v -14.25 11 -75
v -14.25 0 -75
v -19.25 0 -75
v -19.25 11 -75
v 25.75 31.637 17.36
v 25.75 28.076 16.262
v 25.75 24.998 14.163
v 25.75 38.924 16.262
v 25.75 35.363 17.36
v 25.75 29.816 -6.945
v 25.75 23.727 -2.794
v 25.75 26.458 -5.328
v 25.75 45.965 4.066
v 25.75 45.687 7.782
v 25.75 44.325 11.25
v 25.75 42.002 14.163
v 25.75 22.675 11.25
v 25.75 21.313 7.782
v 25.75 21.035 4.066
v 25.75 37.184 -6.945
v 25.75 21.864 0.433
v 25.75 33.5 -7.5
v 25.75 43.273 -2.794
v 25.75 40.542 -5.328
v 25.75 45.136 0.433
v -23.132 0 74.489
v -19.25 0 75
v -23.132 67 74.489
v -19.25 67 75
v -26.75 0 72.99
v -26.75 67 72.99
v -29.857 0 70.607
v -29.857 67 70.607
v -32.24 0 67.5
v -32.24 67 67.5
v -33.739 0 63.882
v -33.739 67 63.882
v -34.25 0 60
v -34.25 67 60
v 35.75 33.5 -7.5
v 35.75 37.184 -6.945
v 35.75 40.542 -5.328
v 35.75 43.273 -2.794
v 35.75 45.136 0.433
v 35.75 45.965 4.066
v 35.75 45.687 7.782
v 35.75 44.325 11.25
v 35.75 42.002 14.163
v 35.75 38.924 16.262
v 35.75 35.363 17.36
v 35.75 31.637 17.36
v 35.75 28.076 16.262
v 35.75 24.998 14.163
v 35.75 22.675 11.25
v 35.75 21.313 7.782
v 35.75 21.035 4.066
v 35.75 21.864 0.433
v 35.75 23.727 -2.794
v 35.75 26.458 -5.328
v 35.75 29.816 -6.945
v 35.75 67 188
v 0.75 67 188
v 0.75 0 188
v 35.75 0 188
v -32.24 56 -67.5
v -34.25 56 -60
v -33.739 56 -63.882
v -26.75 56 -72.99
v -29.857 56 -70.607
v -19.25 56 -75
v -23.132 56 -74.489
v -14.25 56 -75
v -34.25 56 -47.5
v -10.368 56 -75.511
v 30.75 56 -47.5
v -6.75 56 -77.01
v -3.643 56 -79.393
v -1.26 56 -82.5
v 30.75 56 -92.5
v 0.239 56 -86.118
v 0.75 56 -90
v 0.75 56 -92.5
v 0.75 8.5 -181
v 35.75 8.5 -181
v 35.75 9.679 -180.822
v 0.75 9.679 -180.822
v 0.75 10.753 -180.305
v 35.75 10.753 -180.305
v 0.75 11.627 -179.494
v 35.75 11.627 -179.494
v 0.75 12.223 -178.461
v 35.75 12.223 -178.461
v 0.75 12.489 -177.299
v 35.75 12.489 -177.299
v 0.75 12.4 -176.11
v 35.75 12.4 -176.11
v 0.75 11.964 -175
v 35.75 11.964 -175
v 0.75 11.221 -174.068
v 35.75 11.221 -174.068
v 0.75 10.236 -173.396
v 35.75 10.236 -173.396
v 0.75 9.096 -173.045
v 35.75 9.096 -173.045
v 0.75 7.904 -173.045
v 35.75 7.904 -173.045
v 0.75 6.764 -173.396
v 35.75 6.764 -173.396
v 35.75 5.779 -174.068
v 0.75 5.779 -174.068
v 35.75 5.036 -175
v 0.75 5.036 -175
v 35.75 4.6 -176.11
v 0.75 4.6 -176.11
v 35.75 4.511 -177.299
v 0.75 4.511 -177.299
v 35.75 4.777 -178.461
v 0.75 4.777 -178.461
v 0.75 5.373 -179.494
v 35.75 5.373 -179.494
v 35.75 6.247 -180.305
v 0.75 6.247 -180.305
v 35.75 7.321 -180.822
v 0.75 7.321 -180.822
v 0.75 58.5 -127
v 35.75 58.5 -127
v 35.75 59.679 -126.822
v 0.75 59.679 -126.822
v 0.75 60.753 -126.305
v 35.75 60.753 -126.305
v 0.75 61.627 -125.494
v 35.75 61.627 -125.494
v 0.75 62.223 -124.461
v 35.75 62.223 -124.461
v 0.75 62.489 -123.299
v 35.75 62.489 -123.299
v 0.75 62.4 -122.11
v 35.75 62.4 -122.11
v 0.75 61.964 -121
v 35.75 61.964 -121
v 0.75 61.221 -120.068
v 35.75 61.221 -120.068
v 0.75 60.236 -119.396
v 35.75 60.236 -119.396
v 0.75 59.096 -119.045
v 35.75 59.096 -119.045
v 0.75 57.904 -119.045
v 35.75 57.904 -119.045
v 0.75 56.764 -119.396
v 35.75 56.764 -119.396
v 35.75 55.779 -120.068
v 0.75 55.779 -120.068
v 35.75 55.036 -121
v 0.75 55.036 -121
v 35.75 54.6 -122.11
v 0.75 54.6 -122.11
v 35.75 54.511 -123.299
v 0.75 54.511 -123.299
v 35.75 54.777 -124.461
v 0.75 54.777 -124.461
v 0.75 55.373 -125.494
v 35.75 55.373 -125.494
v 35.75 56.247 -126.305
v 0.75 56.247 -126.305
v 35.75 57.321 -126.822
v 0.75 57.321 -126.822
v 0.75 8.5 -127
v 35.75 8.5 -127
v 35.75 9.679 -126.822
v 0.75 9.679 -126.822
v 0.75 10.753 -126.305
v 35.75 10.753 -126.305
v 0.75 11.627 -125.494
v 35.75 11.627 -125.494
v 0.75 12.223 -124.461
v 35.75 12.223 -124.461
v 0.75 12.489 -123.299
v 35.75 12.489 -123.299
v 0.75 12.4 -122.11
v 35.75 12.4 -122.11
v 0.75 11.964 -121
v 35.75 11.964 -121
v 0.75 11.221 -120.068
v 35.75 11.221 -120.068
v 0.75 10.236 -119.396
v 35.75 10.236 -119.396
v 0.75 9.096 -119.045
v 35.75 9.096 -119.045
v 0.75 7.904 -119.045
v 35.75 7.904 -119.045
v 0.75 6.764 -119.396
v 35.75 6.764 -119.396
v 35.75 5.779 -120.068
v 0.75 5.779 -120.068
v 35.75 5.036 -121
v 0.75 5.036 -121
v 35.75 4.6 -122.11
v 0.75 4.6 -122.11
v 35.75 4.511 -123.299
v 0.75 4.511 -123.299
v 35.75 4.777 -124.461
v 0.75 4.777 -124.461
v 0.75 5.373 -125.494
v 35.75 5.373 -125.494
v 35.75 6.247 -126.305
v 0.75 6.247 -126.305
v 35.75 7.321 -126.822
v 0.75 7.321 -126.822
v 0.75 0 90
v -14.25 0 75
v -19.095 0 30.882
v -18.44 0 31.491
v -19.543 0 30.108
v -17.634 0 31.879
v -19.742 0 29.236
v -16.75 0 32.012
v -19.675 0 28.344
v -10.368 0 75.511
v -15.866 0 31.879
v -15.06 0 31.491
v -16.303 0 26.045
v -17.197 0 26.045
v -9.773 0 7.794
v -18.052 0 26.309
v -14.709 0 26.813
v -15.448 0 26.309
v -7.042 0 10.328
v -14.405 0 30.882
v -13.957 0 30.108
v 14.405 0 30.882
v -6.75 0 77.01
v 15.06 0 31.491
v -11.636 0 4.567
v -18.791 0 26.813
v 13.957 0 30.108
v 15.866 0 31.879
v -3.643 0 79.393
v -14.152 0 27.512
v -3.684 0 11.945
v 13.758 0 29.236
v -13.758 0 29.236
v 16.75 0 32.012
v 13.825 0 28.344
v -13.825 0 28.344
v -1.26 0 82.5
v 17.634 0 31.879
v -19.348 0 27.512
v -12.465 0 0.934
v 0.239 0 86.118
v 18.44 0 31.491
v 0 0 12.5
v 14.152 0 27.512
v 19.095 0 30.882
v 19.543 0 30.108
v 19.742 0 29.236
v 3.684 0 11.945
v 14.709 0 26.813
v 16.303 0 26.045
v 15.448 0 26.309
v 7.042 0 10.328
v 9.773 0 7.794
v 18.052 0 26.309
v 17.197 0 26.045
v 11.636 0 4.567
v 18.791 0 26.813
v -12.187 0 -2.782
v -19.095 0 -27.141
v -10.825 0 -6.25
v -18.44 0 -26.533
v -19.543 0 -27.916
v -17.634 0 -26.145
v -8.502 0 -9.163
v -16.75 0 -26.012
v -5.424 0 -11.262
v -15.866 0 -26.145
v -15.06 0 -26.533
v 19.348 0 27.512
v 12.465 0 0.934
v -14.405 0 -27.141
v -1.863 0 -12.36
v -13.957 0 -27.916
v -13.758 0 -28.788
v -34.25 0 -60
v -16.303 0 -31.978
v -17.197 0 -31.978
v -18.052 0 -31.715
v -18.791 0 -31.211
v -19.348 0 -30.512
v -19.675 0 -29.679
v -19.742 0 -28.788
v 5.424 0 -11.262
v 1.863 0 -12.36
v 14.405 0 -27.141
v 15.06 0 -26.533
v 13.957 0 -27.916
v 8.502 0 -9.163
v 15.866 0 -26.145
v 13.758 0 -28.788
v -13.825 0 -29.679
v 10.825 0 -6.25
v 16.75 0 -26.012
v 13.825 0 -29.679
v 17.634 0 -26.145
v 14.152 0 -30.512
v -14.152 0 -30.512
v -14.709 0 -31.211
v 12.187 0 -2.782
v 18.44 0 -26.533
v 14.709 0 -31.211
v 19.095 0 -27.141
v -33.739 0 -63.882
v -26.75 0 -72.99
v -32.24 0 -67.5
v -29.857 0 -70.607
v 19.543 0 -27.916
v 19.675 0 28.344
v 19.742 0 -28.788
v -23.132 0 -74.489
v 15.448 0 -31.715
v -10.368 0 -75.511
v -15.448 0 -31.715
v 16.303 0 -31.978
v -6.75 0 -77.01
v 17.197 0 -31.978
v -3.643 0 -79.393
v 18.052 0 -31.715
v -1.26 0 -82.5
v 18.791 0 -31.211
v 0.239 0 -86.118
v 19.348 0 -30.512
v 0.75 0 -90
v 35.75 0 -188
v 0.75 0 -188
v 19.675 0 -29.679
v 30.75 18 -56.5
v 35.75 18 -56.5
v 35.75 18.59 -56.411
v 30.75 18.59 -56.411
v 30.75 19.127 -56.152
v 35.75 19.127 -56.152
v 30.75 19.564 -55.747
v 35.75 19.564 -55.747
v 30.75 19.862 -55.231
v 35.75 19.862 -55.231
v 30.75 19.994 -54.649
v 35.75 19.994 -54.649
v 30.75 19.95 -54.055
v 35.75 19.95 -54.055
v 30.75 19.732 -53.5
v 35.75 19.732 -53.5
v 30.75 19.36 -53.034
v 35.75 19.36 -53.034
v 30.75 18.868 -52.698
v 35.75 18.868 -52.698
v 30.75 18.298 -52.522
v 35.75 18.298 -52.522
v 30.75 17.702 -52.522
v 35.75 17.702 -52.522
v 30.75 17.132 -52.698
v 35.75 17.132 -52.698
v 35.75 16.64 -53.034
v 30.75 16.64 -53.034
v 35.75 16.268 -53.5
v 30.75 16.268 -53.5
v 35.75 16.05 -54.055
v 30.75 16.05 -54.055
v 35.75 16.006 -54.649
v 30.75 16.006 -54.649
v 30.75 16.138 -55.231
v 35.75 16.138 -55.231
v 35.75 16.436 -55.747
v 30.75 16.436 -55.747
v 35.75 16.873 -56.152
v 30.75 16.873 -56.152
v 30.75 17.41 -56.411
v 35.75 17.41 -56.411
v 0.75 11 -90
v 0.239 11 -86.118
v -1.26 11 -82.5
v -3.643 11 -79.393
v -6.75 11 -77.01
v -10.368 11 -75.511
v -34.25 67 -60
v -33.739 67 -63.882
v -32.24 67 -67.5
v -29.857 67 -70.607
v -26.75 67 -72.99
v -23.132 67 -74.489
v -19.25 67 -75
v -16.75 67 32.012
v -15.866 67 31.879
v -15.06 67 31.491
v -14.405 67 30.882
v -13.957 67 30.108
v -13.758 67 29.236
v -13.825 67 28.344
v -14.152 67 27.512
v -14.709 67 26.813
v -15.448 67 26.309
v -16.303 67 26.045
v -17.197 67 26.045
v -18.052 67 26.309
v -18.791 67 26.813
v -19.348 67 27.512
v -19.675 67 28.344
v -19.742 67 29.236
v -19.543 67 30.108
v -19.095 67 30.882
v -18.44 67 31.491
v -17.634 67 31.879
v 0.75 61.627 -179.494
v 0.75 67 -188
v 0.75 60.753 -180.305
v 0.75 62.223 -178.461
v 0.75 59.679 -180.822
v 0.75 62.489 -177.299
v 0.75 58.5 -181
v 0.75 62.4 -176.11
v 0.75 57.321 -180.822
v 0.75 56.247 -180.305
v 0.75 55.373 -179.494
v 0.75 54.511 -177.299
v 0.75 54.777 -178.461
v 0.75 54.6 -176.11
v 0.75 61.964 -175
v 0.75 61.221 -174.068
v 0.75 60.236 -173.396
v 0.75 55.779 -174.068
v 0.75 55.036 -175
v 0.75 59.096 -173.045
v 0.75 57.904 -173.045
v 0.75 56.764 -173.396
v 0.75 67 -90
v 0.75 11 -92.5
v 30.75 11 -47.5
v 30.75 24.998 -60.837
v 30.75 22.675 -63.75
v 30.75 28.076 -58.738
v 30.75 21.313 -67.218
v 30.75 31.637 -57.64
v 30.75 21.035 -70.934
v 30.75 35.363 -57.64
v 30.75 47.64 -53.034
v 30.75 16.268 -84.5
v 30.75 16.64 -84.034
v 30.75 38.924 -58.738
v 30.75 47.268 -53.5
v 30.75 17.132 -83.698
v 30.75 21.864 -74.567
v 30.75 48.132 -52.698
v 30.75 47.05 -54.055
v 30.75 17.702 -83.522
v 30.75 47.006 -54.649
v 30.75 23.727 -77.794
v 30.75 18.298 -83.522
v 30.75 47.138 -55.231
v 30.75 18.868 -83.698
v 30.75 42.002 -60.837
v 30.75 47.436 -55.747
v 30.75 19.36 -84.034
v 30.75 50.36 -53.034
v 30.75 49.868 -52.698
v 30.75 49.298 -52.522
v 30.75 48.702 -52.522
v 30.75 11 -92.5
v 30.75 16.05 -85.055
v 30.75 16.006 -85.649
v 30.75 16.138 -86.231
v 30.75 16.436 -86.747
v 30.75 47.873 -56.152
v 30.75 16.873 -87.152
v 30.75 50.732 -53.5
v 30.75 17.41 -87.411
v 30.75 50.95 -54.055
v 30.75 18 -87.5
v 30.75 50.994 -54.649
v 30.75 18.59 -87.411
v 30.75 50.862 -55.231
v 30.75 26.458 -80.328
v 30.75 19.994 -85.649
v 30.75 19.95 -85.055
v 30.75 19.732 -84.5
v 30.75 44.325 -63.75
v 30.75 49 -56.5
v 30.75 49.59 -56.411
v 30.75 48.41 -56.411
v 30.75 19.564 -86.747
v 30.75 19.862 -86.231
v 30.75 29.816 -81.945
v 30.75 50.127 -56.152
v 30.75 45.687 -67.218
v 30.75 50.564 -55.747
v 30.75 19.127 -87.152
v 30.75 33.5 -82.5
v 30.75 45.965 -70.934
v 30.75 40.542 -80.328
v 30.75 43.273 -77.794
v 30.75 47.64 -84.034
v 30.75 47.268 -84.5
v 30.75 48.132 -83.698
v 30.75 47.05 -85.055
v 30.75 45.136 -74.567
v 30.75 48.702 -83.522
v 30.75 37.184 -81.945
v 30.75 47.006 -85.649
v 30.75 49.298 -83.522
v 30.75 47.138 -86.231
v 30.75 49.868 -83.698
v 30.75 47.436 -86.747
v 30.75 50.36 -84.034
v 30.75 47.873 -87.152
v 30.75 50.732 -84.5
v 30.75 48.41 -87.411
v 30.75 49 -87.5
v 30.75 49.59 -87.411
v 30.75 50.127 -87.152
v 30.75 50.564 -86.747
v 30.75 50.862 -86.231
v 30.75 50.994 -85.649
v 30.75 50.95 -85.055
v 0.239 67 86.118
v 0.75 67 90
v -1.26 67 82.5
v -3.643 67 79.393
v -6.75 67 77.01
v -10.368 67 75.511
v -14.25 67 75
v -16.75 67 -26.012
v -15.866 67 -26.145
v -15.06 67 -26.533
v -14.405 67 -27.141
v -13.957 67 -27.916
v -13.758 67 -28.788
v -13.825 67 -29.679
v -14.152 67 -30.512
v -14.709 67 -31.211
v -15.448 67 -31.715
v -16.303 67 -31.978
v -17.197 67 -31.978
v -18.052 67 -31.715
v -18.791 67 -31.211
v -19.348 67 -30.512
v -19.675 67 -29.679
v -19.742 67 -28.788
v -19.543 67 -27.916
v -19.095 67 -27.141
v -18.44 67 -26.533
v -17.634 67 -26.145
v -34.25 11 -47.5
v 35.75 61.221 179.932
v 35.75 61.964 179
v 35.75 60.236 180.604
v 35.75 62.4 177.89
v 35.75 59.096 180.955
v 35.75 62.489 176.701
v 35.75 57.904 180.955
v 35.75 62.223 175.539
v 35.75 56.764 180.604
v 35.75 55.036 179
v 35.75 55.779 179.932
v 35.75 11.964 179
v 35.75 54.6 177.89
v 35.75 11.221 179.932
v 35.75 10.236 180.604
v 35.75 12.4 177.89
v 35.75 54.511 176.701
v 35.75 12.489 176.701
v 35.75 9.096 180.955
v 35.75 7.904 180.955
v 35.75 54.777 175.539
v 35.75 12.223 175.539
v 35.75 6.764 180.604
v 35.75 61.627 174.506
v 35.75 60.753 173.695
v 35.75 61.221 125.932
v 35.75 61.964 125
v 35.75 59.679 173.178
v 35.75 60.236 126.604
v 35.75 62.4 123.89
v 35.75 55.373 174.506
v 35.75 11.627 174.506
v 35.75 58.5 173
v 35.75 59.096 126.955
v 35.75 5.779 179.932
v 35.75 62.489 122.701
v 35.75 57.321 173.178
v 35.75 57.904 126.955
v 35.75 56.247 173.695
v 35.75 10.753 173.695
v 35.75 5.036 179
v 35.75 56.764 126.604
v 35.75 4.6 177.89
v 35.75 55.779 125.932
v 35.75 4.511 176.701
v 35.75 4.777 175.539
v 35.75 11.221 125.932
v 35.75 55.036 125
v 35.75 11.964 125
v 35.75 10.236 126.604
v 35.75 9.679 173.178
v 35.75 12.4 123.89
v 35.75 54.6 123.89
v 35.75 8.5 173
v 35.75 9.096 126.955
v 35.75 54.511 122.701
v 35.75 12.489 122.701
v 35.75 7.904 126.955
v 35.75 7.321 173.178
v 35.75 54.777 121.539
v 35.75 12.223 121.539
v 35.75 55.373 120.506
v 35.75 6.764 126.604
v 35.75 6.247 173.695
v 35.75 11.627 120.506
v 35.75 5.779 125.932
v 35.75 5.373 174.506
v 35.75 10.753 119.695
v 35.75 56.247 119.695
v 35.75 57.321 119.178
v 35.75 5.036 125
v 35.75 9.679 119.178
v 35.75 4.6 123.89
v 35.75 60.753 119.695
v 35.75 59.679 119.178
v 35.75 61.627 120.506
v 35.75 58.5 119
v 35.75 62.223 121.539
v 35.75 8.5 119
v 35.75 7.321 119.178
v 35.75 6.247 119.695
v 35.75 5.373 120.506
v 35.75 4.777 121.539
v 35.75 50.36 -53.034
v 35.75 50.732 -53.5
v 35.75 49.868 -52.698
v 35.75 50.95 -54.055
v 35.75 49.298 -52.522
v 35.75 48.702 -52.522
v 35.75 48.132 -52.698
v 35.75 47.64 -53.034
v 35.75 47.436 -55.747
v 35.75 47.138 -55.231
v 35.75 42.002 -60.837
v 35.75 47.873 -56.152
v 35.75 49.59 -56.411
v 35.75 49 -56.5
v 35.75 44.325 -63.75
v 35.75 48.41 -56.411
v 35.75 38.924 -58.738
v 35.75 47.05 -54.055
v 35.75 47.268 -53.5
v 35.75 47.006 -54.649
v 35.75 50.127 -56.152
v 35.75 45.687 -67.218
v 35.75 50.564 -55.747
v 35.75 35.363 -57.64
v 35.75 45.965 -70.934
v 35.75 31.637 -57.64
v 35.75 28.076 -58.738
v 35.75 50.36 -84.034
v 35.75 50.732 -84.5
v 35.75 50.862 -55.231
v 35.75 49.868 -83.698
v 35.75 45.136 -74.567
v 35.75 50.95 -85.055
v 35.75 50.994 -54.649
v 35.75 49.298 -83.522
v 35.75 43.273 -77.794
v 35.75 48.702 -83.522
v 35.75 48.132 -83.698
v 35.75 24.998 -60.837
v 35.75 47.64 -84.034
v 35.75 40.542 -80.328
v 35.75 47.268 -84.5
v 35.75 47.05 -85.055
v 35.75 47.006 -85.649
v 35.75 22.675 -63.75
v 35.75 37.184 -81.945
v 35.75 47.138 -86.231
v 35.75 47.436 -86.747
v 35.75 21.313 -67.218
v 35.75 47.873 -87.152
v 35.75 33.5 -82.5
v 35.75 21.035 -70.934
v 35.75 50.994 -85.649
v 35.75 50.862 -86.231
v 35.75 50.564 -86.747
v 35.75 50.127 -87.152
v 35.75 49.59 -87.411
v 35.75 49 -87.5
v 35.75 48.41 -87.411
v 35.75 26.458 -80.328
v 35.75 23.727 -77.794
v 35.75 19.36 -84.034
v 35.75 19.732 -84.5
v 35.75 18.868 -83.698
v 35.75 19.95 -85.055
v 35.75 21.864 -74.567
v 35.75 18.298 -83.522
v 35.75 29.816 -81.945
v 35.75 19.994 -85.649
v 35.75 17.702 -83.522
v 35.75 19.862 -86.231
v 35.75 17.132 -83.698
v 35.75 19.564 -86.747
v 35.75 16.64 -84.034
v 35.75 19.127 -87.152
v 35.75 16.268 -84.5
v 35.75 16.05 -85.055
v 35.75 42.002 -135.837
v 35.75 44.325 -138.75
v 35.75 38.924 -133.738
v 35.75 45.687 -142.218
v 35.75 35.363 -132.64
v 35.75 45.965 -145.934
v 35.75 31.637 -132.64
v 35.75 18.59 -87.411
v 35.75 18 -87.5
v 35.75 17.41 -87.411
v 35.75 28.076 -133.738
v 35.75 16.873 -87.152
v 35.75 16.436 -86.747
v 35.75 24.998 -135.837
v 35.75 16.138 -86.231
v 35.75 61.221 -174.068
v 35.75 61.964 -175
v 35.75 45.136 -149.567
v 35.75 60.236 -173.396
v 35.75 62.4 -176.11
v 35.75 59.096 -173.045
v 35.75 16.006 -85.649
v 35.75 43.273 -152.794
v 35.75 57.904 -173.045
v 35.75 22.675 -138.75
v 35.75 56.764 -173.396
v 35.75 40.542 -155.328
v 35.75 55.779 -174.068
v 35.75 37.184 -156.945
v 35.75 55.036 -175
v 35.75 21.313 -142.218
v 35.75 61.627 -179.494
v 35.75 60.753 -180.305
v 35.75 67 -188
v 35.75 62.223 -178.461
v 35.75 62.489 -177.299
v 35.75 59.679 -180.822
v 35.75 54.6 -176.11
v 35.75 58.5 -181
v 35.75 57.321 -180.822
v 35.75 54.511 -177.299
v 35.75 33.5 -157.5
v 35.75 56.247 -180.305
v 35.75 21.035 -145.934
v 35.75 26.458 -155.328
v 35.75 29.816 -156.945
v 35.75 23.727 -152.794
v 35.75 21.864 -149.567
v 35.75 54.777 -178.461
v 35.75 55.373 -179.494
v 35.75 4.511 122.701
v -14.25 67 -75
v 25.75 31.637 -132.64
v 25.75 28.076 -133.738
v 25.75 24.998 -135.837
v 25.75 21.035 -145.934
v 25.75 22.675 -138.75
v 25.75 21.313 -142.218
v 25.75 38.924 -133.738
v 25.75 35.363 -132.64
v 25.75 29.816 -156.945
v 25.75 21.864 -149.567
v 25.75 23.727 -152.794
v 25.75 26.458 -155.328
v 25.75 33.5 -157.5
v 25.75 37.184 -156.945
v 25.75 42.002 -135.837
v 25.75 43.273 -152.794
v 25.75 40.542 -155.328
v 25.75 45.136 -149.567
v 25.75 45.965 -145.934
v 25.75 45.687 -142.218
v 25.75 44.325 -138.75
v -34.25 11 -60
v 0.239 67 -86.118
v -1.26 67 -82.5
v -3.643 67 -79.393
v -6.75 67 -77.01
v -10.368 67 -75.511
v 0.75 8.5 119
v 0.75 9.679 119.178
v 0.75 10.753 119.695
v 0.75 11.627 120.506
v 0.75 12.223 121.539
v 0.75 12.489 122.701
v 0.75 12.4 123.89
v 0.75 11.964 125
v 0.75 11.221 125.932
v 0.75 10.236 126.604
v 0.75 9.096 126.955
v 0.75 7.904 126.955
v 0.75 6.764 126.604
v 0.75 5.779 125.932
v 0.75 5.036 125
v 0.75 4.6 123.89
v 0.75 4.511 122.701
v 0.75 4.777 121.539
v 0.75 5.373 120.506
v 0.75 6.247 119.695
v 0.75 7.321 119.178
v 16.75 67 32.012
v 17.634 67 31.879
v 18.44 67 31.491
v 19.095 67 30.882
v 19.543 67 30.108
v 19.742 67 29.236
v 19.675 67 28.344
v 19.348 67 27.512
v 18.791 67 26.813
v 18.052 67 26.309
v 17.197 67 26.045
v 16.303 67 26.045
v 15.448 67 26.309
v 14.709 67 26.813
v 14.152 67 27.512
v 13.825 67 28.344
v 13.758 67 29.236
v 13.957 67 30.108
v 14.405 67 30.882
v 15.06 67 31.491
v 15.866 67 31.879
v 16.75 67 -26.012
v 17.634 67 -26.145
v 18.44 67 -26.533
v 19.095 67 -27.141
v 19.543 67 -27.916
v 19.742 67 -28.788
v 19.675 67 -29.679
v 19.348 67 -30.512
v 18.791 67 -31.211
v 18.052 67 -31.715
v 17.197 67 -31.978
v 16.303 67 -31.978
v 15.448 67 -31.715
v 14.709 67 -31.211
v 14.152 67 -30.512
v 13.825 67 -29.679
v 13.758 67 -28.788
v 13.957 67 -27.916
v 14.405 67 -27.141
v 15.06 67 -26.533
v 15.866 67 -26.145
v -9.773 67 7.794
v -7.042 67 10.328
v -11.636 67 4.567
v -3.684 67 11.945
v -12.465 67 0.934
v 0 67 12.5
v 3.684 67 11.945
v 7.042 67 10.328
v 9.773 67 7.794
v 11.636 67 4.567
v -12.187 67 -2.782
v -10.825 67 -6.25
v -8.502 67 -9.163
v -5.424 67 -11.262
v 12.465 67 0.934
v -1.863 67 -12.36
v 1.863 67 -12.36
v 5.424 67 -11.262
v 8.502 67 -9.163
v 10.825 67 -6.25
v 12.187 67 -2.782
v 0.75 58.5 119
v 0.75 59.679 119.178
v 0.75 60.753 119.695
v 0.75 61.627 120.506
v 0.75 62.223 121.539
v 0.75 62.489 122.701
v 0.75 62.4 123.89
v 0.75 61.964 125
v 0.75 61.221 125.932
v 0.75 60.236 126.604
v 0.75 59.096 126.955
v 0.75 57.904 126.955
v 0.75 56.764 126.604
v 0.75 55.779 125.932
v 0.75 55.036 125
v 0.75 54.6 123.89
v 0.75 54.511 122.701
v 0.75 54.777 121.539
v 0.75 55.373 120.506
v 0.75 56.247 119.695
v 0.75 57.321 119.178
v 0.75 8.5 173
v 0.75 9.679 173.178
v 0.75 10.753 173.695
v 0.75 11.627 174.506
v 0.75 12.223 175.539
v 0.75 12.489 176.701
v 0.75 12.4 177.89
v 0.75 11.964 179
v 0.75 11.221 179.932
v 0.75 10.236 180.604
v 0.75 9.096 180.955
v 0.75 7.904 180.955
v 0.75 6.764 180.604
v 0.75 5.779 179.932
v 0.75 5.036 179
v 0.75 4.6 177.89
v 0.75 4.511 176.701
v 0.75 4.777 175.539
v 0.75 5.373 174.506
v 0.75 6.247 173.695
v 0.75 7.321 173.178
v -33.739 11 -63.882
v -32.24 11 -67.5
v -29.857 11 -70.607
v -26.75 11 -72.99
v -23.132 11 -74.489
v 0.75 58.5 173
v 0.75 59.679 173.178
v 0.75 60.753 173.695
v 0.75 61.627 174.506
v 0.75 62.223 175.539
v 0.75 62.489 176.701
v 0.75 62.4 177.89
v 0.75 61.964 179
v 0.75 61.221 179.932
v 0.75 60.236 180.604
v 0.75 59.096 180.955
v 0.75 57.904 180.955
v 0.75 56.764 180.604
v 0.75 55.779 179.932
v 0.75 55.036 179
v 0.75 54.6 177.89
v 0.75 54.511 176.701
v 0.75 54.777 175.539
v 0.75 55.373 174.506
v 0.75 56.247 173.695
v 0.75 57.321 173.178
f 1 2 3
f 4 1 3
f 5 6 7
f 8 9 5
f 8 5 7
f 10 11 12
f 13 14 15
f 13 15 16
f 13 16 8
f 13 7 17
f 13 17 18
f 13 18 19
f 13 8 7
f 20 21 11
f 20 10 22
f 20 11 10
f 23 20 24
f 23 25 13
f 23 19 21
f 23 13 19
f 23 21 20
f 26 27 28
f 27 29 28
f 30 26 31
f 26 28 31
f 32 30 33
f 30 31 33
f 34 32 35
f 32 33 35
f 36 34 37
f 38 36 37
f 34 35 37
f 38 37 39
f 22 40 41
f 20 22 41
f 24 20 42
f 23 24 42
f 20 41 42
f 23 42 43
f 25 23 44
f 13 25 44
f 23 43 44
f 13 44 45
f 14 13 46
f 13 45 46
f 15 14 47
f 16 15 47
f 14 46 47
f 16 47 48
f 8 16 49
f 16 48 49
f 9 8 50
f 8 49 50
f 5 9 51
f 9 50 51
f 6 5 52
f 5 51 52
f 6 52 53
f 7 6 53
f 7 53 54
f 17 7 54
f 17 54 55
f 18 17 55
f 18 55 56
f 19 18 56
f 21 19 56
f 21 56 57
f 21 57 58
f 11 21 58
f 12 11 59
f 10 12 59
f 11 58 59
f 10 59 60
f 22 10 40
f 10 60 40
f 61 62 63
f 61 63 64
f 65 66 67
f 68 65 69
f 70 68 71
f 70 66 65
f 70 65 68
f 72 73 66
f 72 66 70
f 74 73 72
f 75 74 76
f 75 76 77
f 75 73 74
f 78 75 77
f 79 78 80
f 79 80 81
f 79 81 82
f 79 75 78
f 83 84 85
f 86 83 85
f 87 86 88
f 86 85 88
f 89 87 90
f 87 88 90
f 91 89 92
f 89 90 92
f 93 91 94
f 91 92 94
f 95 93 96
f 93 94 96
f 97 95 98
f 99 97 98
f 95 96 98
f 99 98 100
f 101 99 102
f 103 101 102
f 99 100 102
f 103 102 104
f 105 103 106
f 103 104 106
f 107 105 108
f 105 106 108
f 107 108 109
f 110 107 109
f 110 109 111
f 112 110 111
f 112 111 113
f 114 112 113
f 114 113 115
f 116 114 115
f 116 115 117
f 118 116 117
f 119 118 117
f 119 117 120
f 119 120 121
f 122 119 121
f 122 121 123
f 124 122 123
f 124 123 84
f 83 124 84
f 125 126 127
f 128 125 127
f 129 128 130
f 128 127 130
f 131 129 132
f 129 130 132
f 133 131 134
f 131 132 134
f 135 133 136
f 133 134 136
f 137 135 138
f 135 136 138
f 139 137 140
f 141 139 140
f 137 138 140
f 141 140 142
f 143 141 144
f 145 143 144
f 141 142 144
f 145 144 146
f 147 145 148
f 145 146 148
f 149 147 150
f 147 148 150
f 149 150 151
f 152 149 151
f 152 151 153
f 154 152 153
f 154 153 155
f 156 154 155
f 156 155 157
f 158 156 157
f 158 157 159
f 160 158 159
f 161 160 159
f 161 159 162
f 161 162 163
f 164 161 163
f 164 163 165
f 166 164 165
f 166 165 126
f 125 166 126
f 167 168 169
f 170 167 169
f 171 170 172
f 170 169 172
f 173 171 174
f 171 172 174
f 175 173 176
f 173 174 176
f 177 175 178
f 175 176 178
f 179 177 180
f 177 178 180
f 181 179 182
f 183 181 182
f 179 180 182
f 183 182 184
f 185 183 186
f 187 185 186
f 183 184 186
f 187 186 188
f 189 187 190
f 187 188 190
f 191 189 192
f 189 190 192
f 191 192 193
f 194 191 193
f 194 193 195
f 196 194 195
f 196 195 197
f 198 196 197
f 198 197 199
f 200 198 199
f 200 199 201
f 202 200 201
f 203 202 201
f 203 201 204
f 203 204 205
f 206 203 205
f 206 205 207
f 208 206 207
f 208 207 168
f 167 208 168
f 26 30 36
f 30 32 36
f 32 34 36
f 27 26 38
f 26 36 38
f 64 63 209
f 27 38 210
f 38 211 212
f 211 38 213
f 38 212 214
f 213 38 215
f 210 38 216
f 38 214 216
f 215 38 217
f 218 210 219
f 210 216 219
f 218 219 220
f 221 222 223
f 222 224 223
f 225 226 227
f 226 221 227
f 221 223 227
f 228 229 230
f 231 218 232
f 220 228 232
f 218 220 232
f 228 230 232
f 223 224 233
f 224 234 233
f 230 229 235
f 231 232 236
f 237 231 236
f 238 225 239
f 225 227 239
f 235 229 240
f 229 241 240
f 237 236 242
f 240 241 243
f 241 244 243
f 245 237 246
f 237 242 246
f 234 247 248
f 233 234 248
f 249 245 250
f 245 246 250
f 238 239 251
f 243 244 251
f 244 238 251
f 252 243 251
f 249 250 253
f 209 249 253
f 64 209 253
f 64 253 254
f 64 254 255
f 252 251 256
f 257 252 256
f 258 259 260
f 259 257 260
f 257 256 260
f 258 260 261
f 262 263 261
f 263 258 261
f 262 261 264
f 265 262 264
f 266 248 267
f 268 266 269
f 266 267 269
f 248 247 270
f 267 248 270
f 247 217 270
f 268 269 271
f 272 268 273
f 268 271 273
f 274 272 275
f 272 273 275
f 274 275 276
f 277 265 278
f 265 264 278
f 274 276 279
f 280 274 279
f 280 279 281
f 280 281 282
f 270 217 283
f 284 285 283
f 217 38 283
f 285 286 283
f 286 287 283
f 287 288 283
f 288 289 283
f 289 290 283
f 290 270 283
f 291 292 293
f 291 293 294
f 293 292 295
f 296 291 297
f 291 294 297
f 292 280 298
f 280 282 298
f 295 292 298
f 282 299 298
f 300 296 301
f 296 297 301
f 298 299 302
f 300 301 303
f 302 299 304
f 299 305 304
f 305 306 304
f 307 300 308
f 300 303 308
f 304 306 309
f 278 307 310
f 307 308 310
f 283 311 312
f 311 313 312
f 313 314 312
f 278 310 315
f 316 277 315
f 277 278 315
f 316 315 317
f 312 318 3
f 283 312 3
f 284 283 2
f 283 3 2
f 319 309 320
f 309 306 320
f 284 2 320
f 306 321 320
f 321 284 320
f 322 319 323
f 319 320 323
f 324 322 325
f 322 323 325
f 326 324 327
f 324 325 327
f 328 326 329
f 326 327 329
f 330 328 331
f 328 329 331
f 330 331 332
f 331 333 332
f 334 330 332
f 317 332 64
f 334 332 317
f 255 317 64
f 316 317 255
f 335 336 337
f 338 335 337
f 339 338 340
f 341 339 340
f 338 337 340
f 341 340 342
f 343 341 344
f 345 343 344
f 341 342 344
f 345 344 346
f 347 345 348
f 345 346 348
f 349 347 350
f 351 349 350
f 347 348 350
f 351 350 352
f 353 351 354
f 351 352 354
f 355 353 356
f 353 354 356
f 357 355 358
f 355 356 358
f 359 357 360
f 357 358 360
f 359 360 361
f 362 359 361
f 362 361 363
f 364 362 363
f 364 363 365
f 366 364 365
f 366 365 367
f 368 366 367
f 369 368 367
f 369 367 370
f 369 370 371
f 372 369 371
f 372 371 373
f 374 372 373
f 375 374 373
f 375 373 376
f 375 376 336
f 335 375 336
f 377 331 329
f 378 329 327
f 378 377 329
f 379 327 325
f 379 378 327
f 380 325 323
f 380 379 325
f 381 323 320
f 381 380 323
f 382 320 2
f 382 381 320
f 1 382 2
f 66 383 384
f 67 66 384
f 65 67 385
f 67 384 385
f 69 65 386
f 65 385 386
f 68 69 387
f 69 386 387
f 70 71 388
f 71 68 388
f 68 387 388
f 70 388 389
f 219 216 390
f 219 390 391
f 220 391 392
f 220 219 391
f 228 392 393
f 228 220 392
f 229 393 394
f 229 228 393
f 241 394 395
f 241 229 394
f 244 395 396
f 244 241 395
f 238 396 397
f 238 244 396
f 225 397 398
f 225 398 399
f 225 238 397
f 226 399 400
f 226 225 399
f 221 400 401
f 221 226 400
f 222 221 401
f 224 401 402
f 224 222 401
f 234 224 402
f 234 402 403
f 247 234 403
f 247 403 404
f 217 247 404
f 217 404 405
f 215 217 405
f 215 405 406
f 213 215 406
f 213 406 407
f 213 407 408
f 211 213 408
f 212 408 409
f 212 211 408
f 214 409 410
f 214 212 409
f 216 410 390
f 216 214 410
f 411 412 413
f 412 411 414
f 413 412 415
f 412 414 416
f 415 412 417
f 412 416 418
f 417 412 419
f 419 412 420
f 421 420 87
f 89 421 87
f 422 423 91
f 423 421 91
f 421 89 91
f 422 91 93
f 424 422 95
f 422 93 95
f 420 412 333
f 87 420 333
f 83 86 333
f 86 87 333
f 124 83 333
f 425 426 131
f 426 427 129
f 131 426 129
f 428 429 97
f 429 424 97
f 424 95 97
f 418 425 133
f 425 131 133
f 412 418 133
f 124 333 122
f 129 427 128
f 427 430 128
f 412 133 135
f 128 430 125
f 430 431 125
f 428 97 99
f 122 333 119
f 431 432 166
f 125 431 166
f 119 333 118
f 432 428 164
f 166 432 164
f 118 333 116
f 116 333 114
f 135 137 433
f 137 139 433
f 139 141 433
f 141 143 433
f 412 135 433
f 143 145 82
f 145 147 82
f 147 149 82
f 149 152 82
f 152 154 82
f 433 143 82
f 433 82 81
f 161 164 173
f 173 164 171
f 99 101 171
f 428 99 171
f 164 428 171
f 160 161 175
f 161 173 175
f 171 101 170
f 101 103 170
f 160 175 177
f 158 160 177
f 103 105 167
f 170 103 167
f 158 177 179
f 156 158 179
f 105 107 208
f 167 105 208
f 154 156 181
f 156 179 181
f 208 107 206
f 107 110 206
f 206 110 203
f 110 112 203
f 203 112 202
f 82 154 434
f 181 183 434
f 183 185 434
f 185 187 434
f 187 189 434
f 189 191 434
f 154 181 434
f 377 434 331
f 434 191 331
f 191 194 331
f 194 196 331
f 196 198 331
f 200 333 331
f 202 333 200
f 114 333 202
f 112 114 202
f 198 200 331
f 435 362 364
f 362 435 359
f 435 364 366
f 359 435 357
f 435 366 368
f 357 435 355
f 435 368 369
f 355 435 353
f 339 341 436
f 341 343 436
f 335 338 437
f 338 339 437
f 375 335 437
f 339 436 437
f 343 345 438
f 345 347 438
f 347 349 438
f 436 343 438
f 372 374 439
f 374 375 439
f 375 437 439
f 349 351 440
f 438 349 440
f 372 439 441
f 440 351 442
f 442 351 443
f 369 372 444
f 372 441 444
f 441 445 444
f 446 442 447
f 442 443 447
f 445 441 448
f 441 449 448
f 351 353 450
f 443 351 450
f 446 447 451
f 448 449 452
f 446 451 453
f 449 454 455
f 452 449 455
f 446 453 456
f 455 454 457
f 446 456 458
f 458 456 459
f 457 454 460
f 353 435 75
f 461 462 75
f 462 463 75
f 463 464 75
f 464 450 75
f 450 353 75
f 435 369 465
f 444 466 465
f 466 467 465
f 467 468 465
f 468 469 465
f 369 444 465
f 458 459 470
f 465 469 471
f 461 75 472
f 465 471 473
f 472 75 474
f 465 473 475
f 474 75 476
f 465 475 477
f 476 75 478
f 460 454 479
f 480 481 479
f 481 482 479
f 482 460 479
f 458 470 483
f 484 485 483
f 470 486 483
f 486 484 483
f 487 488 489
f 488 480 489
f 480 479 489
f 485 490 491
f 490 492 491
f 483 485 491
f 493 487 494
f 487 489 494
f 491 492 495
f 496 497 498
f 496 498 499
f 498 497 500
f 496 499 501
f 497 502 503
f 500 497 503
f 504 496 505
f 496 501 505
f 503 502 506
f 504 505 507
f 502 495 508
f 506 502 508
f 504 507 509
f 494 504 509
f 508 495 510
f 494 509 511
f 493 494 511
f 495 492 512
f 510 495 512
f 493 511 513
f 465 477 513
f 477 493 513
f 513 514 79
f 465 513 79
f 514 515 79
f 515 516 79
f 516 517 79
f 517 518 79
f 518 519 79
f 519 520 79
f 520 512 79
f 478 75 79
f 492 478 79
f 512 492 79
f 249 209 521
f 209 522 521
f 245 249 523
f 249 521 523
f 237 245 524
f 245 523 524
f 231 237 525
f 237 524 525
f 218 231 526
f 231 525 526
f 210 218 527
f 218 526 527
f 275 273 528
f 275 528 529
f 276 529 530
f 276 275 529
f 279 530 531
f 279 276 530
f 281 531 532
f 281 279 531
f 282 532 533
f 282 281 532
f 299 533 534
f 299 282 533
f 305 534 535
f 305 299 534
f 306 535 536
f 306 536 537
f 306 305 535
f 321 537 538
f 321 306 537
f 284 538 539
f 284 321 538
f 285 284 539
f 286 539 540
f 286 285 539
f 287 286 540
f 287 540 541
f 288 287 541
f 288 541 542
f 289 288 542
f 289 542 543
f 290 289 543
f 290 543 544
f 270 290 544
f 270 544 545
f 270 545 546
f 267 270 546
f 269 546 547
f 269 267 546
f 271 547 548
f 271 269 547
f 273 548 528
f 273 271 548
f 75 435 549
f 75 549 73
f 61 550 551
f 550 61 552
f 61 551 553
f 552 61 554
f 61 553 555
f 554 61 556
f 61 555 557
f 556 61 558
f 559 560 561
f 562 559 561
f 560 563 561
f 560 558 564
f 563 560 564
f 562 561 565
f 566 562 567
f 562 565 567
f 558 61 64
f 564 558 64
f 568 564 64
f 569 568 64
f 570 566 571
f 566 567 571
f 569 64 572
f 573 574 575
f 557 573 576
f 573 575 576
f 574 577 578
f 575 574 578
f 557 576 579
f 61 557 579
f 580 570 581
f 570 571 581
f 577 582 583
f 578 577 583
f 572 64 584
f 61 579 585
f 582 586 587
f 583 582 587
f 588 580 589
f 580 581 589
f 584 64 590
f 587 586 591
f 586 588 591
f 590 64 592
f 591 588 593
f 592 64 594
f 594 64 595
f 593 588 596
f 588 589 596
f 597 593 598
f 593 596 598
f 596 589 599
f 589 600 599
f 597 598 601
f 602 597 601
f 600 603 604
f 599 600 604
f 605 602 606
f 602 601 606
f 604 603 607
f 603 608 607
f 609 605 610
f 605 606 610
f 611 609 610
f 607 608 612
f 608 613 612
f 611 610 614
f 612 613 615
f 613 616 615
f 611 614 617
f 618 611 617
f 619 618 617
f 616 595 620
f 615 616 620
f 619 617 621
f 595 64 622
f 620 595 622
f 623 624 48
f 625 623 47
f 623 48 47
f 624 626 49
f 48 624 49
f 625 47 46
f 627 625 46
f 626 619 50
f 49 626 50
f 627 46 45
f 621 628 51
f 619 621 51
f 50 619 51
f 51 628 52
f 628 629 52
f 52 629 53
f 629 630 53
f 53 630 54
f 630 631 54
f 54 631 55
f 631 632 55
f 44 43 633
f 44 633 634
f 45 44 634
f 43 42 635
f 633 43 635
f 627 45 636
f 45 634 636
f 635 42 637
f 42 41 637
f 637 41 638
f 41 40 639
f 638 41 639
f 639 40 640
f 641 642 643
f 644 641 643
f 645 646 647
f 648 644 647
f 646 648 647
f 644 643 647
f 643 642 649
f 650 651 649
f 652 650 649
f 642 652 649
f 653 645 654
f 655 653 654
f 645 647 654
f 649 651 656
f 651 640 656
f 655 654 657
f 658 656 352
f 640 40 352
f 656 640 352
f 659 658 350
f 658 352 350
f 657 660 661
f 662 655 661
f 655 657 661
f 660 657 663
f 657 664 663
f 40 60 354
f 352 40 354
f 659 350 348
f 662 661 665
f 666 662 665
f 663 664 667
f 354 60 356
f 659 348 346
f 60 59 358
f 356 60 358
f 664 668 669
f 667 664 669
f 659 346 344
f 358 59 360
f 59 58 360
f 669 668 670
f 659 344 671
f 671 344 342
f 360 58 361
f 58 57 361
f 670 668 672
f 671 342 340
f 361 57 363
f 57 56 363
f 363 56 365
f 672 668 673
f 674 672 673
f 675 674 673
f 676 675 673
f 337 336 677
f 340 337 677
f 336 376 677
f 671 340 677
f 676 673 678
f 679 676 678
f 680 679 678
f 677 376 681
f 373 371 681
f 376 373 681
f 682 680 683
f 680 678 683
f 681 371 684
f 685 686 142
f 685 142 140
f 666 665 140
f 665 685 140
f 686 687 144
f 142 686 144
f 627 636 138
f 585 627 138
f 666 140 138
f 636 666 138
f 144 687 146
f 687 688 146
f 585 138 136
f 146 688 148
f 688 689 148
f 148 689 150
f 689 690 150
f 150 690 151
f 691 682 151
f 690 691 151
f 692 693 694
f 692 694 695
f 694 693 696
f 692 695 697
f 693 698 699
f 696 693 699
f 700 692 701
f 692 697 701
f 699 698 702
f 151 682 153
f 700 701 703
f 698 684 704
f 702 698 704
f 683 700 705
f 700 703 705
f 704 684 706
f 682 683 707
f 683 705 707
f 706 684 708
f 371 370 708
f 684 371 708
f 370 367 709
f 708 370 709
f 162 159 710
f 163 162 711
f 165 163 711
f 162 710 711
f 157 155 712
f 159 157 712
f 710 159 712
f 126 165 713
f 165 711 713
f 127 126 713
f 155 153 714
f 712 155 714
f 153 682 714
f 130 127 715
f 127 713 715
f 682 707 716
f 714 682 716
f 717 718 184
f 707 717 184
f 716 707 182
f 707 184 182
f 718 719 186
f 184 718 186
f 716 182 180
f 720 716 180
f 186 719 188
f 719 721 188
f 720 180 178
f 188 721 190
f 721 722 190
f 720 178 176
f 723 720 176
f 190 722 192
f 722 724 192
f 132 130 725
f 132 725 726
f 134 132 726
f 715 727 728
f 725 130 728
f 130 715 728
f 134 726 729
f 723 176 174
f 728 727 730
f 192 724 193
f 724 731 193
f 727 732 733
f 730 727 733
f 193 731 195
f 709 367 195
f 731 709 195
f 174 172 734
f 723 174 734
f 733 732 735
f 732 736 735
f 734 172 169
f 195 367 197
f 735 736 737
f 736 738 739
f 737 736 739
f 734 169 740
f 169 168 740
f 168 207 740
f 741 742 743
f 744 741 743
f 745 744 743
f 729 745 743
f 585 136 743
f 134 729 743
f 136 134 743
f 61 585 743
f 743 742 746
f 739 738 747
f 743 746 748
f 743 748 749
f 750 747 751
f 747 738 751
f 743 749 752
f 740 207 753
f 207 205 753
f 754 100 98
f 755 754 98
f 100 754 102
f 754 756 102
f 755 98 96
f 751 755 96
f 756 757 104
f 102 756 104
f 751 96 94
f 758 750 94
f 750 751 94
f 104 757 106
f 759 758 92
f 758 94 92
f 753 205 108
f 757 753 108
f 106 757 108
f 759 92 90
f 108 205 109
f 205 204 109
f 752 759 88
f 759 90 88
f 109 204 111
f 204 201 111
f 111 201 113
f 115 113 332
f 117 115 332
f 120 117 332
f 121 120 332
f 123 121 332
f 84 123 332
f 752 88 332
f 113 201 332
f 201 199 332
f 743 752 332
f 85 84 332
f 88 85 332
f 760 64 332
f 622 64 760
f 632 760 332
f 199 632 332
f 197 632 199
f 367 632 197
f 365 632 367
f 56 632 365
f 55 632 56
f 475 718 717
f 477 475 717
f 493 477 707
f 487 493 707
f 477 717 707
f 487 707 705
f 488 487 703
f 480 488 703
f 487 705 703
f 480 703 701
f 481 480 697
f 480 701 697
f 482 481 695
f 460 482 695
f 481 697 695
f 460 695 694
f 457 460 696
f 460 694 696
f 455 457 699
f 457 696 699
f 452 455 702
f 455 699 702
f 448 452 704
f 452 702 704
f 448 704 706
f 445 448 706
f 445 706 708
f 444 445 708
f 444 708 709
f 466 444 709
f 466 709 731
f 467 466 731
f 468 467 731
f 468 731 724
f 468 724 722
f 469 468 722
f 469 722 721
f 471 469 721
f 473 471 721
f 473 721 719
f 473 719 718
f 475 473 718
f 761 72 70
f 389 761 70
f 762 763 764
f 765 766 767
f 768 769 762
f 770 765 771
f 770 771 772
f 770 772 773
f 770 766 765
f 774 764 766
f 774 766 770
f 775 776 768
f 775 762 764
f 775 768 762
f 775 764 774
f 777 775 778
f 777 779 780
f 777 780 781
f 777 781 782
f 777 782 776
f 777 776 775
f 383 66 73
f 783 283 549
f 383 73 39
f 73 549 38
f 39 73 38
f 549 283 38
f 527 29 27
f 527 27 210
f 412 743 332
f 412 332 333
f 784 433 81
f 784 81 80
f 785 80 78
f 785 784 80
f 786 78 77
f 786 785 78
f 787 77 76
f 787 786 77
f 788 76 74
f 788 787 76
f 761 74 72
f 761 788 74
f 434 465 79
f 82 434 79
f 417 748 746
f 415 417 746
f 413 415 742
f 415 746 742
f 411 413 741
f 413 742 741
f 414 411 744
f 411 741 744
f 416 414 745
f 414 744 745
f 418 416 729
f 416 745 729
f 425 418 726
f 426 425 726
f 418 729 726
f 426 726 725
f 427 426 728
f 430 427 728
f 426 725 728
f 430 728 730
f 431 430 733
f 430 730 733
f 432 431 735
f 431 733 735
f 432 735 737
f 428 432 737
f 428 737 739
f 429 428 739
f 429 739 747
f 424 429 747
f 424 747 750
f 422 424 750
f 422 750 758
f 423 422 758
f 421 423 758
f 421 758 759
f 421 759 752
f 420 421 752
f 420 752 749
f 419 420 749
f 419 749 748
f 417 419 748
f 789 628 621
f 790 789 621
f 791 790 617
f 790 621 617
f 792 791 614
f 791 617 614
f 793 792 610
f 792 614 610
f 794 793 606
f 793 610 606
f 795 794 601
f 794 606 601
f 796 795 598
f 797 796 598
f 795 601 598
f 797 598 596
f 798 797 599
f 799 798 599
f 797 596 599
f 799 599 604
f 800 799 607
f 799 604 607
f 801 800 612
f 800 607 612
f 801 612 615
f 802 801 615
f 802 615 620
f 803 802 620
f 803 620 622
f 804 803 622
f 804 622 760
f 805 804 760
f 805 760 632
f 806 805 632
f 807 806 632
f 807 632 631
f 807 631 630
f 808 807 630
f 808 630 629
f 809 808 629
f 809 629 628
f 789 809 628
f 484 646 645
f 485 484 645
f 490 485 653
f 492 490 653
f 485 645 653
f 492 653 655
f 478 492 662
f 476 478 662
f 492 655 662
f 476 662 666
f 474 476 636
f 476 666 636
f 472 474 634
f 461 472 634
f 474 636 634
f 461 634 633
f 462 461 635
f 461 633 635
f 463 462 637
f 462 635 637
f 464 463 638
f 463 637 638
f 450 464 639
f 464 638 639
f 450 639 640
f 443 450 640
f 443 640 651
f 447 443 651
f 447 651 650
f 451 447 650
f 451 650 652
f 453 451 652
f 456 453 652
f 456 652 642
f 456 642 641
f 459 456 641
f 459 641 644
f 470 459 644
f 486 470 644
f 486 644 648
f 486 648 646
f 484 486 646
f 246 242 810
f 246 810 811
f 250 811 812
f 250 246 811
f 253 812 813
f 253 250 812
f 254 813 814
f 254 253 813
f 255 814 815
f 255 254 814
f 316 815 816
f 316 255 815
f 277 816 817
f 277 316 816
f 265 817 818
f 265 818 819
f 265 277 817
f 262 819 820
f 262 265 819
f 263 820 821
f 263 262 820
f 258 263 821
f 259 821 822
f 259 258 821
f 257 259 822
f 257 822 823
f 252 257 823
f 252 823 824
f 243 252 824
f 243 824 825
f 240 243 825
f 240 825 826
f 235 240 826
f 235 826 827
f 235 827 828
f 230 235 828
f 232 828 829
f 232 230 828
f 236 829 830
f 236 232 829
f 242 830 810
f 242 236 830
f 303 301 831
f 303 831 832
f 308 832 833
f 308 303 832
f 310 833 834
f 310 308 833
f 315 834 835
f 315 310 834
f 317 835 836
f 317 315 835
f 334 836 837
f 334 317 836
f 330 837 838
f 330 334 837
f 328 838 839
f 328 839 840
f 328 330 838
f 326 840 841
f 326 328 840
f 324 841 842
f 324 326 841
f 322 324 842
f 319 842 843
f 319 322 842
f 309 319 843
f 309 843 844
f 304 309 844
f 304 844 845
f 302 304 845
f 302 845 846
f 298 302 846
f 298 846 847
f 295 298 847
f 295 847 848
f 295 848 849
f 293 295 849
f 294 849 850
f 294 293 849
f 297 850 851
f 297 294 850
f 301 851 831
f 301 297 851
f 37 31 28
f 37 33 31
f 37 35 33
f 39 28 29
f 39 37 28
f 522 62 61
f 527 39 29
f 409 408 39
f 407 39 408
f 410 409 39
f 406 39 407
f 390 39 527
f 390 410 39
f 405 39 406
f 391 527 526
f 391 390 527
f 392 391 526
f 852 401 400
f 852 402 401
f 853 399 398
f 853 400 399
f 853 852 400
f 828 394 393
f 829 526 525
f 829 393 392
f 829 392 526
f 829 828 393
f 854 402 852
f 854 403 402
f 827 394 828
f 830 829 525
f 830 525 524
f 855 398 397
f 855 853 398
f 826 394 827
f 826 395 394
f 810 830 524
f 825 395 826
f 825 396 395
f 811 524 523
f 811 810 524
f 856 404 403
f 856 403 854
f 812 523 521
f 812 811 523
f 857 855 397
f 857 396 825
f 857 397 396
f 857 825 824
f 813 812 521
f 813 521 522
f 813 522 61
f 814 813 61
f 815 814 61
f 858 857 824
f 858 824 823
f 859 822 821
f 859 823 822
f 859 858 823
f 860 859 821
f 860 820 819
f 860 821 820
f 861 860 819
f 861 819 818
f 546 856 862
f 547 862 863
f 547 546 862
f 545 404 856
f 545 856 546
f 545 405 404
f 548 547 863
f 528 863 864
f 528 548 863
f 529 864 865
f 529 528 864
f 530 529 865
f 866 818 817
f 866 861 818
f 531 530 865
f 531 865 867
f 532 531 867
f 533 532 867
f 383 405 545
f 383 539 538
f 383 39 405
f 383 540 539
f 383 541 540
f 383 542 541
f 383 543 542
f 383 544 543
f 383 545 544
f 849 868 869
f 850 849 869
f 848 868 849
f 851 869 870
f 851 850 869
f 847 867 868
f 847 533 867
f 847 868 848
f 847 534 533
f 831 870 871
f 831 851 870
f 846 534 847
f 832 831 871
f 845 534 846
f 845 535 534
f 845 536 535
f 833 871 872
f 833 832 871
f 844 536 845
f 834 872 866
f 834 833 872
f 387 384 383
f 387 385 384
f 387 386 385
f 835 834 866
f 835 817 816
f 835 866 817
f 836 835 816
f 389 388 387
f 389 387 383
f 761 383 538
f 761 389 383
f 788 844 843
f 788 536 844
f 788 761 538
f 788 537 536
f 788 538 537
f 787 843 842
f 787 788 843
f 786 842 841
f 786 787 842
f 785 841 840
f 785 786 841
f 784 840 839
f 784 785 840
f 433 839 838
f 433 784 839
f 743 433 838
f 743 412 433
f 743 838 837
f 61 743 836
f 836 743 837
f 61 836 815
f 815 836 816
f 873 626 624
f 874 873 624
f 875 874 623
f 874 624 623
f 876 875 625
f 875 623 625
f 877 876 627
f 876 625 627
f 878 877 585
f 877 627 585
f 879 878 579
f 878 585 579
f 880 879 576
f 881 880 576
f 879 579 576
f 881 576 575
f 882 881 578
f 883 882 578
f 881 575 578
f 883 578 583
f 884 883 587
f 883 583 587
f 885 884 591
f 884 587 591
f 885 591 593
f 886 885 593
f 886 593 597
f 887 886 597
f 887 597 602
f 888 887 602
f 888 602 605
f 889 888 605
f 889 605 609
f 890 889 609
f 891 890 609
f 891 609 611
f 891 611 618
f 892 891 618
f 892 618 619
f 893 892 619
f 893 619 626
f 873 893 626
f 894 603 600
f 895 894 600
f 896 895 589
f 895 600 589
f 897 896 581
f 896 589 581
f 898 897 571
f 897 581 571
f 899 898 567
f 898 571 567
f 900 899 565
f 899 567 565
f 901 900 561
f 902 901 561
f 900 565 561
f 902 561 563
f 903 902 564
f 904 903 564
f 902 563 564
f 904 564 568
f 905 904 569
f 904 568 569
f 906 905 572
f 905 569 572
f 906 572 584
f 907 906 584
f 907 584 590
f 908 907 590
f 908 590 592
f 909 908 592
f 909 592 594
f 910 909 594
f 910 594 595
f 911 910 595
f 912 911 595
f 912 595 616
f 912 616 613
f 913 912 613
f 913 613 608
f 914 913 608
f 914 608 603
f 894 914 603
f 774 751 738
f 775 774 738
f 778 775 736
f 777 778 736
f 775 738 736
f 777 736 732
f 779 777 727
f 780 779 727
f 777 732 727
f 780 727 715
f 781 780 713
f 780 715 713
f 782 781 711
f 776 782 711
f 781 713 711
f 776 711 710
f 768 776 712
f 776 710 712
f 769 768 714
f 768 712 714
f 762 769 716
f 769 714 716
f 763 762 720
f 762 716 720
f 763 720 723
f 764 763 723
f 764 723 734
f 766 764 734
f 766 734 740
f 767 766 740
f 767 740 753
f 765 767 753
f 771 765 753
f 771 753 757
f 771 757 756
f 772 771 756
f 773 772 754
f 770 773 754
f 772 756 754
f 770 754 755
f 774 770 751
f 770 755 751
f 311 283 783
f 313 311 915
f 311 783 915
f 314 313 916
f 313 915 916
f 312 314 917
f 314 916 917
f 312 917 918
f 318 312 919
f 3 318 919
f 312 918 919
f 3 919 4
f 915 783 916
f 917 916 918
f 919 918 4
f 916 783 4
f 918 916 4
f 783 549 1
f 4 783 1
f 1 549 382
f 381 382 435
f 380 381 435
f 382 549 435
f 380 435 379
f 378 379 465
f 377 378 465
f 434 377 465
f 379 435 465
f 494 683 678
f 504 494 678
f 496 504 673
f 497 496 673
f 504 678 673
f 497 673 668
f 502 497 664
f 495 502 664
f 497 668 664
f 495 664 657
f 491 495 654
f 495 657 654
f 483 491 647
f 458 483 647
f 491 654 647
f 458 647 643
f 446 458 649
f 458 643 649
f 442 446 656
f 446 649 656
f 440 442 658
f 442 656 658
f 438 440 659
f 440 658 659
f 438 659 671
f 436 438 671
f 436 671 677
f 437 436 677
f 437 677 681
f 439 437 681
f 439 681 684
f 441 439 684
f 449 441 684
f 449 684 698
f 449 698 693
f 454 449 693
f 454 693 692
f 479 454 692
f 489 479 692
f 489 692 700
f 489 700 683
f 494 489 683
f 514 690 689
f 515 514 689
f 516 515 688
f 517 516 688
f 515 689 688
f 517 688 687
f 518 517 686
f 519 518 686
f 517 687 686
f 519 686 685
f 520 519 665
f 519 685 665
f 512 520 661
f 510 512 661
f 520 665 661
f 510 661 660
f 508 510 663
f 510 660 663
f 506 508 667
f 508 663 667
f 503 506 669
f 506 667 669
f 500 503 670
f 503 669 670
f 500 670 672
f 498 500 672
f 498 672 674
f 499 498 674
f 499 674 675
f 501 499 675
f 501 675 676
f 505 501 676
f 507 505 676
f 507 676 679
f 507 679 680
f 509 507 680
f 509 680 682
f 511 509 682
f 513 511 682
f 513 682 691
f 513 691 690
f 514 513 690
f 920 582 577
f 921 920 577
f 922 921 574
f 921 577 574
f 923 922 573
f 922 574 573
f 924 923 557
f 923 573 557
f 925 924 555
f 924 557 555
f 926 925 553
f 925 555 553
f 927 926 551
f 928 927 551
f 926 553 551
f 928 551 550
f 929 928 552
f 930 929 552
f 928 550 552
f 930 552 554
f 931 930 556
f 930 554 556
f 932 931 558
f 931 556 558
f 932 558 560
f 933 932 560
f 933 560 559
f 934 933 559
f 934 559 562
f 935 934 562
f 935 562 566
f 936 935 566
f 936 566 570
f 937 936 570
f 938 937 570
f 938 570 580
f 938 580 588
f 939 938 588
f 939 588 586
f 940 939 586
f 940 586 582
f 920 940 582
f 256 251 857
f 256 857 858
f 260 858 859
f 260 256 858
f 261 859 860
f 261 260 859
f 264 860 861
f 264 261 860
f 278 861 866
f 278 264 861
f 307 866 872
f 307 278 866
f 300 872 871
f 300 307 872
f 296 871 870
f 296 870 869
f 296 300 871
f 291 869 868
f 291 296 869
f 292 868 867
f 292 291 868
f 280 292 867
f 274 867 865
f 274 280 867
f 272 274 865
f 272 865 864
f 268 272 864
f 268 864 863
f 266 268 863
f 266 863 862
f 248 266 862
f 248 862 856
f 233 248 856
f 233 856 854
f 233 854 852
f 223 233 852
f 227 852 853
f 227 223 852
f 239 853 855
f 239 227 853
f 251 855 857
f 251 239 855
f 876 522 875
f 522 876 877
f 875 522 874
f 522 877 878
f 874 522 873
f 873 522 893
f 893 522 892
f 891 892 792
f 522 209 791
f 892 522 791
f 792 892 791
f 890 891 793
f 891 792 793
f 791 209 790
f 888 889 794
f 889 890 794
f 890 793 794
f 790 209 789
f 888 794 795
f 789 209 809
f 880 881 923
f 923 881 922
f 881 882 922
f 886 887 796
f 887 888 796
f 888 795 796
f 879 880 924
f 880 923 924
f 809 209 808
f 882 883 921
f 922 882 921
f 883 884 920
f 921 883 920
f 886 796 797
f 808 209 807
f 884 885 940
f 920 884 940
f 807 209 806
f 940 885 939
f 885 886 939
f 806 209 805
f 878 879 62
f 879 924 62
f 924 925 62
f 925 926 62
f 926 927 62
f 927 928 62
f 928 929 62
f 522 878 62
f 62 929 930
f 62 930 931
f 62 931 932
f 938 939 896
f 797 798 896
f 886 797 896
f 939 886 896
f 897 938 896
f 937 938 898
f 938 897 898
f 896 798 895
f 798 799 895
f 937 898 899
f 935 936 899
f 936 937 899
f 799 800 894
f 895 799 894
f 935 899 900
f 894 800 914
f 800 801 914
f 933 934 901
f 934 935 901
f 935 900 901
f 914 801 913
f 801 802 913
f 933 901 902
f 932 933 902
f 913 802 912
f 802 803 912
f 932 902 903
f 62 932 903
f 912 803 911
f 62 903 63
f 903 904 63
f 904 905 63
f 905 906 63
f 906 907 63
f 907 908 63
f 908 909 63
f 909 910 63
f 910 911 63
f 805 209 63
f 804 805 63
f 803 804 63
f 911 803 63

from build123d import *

# Parameters (mm, degrees)
SKETCH1_R           = 12.5
SKETCH1_R_2         = 3
BOSS_EXTRUDE1_DEPTH = 67
SKETCH2_R           = 4
CUT_EXTRUDE1_DEPTH  = 212.501773042
FILLET1_R           = 15
CUT_EXTRUDE3_REACH  = 218.502
CUT_EXTRUDE3_START  = -5
SKETCH3_W           = 45
SKETCH3_H           = 45
SKETCH3_R           = 2
SKETCH3_R_2         = 12.5
SKETCH3_2_R         = 2
SKETCH3_2_R_2       = 12.5
CUT_EXTRUDE4_DEPTH  = 212.501773075
SKETCH3_4_R         = 12.5
CUT_EXTRUDE5_DEPTH  = 10


with BuildPart() as part:
    # Sketch1 → Boss-Extrude1 (new body)
    with BuildSketch(Plane(origin=(0, 0, 0), x_dir=(1, 0, 0), z_dir=(0, 1, 0))):
        Polygon((0.75, -188), (35.75, -188), (35.75, 188), (0.75, 188), (0.75, 75), (-34.25, 75), (-34.25, -75), (0.75, -75), align=None)
        with Locations(Location((0, 0, 0), (0, 0, 270))):
            Circle(SKETCH1_R, mode=Mode.SUBTRACT)
        with Locations(Location((-16.75, -29.011851027, 0), (0, 0, 270))):
            Circle(SKETCH1_R_2, mode=Mode.SUBTRACT)
        with Locations(Location((16.75, -29.011851027, 0), (0, 0, 270))):
            Circle(SKETCH1_R_2, mode=Mode.SUBTRACT)
        with Locations(Location((16.75, 29.011851027, 0), (0, 0, 270))):
            Circle(SKETCH1_R_2, mode=Mode.SUBTRACT)
        with Locations(Location((-16.75, 29.011851027, 0), (0, 0, 270))):
            Circle(SKETCH1_R_2, mode=Mode.SUBTRACT)
    extrude(amount=BOSS_EXTRUDE1_DEPTH)

    # Sketch2 → Cut-Extrude1 (cut, through all)
    with BuildSketch(Plane(origin=(35.75, 0, 0), x_dir=(0, 0, -1), z_dir=(1, 0, 0))):
        with Locations((-177, 58.5)):
            Circle(SKETCH2_R)
        with Locations((-123, 58.5)):
            Circle(SKETCH2_R)
        with Locations((-177, 8.5)):
            Circle(SKETCH2_R)
        with Locations((-123, 8.5)):
            Circle(SKETCH2_R)
        with Locations((177, 58.5)):
            Circle(SKETCH2_R)
        with Locations((177, 8.5)):
            Circle(SKETCH2_R)
        with Locations((123, 8.5)):
            Circle(SKETCH2_R)
        with Locations((123, 58.5)):
            Circle(SKETCH2_R)
    extrude(amount=-CUT_EXTRUDE1_DEPTH, mode=Mode.SUBTRACT)

    # Fillet1
    fillet1_edges = [part.edges().sort_by_distance(p)[0] for p in [
        (0.75, 33.5, 75),
        (-34.25, 33.5, 75),
        (-34.25, 33.5, -75),
        (0.75, 33.5, -75),
    ]]
    fillet(fillet1_edges, radius=FILLET1_R)

    # Cut-Extrude3: up to this face of the body (flat: up to its plane)
    cut_extrude3_end = Plane(part.part.faces().sort_by_distance((-34.25, 33.5, 0))[0])
    # Sketch3 → Cut-Extrude3 (cut, up to the picked face)
    with BuildSketch(Plane(origin=(35.75, 0, 0), x_dir=(0, 0, -1), z_dir=(1, 0, 0)).offset(CUT_EXTRUDE3_START), mode=Mode.PRIVATE) as cut_extrude3_sk1:
        with Locations((70, 33.5)):
            Rectangle(SKETCH3_W, SKETCH3_H)
        with Locations((54.5, 49)):
            Circle(SKETCH3_R, mode=Mode.SUBTRACT)
        with Locations((54.5, 18)):
            Circle(SKETCH3_R, mode=Mode.SUBTRACT)
        with Locations((85.5, 18)):
            Circle(SKETCH3_R, mode=Mode.SUBTRACT)
        with Locations((85.5, 49)):
            Circle(SKETCH3_R, mode=Mode.SUBTRACT)
        with Locations((70, 33.5)):
            Circle(SKETCH3_R_2, mode=Mode.SUBTRACT)
    cut_extrude3_tool1 = split(extrude(cut_extrude3_sk1.sketch, amount=-CUT_EXTRUDE3_REACH, mode=Mode.PRIVATE), bisect_by=cut_extrude3_end, keep=Keep.BOTH, mode=Mode.PRIVATE)
    add(cut_extrude3_tool1.solids().sort_by(Axis((30.75, 11.636396, -70), (-1, 0, 0)))[0], mode=Mode.SUBTRACT)

    # Sketch3<2> → Cut-Extrude4 (cut, through all)
    with BuildSketch(Plane(origin=(35.75, 0, 0), x_dir=(0, 0, -1), z_dir=(1, 0, 0))):
        with Locations((54.5, 49)):
            Circle(SKETCH3_2_R)
        with Locations((85.5, 49)):
            Circle(SKETCH3_2_R)
        with Locations((85.5, 18)):
            Circle(SKETCH3_2_R)
        with Locations((54.5, 18)):
            Circle(SKETCH3_2_R)
        with Locations((70, 33.5)):
            Circle(SKETCH3_2_R_2)
    extrude(amount=-CUT_EXTRUDE4_DEPTH, mode=Mode.SUBTRACT)

    # Sketch3<4> → Cut-Extrude5 (cut)
    with BuildSketch(Plane(origin=(35.75, 0, 0), x_dir=(0, 0, -1), z_dir=(1, 0, 0))):
        with Locations((-5, 33.5)):
            Circle(SKETCH3_4_R)
        with Locations((145, 33.5)):
            Circle(SKETCH3_4_R)
    extrude(amount=-CUT_EXTRUDE5_DEPTH, mode=Mode.SUBTRACT)


solid = part.part
